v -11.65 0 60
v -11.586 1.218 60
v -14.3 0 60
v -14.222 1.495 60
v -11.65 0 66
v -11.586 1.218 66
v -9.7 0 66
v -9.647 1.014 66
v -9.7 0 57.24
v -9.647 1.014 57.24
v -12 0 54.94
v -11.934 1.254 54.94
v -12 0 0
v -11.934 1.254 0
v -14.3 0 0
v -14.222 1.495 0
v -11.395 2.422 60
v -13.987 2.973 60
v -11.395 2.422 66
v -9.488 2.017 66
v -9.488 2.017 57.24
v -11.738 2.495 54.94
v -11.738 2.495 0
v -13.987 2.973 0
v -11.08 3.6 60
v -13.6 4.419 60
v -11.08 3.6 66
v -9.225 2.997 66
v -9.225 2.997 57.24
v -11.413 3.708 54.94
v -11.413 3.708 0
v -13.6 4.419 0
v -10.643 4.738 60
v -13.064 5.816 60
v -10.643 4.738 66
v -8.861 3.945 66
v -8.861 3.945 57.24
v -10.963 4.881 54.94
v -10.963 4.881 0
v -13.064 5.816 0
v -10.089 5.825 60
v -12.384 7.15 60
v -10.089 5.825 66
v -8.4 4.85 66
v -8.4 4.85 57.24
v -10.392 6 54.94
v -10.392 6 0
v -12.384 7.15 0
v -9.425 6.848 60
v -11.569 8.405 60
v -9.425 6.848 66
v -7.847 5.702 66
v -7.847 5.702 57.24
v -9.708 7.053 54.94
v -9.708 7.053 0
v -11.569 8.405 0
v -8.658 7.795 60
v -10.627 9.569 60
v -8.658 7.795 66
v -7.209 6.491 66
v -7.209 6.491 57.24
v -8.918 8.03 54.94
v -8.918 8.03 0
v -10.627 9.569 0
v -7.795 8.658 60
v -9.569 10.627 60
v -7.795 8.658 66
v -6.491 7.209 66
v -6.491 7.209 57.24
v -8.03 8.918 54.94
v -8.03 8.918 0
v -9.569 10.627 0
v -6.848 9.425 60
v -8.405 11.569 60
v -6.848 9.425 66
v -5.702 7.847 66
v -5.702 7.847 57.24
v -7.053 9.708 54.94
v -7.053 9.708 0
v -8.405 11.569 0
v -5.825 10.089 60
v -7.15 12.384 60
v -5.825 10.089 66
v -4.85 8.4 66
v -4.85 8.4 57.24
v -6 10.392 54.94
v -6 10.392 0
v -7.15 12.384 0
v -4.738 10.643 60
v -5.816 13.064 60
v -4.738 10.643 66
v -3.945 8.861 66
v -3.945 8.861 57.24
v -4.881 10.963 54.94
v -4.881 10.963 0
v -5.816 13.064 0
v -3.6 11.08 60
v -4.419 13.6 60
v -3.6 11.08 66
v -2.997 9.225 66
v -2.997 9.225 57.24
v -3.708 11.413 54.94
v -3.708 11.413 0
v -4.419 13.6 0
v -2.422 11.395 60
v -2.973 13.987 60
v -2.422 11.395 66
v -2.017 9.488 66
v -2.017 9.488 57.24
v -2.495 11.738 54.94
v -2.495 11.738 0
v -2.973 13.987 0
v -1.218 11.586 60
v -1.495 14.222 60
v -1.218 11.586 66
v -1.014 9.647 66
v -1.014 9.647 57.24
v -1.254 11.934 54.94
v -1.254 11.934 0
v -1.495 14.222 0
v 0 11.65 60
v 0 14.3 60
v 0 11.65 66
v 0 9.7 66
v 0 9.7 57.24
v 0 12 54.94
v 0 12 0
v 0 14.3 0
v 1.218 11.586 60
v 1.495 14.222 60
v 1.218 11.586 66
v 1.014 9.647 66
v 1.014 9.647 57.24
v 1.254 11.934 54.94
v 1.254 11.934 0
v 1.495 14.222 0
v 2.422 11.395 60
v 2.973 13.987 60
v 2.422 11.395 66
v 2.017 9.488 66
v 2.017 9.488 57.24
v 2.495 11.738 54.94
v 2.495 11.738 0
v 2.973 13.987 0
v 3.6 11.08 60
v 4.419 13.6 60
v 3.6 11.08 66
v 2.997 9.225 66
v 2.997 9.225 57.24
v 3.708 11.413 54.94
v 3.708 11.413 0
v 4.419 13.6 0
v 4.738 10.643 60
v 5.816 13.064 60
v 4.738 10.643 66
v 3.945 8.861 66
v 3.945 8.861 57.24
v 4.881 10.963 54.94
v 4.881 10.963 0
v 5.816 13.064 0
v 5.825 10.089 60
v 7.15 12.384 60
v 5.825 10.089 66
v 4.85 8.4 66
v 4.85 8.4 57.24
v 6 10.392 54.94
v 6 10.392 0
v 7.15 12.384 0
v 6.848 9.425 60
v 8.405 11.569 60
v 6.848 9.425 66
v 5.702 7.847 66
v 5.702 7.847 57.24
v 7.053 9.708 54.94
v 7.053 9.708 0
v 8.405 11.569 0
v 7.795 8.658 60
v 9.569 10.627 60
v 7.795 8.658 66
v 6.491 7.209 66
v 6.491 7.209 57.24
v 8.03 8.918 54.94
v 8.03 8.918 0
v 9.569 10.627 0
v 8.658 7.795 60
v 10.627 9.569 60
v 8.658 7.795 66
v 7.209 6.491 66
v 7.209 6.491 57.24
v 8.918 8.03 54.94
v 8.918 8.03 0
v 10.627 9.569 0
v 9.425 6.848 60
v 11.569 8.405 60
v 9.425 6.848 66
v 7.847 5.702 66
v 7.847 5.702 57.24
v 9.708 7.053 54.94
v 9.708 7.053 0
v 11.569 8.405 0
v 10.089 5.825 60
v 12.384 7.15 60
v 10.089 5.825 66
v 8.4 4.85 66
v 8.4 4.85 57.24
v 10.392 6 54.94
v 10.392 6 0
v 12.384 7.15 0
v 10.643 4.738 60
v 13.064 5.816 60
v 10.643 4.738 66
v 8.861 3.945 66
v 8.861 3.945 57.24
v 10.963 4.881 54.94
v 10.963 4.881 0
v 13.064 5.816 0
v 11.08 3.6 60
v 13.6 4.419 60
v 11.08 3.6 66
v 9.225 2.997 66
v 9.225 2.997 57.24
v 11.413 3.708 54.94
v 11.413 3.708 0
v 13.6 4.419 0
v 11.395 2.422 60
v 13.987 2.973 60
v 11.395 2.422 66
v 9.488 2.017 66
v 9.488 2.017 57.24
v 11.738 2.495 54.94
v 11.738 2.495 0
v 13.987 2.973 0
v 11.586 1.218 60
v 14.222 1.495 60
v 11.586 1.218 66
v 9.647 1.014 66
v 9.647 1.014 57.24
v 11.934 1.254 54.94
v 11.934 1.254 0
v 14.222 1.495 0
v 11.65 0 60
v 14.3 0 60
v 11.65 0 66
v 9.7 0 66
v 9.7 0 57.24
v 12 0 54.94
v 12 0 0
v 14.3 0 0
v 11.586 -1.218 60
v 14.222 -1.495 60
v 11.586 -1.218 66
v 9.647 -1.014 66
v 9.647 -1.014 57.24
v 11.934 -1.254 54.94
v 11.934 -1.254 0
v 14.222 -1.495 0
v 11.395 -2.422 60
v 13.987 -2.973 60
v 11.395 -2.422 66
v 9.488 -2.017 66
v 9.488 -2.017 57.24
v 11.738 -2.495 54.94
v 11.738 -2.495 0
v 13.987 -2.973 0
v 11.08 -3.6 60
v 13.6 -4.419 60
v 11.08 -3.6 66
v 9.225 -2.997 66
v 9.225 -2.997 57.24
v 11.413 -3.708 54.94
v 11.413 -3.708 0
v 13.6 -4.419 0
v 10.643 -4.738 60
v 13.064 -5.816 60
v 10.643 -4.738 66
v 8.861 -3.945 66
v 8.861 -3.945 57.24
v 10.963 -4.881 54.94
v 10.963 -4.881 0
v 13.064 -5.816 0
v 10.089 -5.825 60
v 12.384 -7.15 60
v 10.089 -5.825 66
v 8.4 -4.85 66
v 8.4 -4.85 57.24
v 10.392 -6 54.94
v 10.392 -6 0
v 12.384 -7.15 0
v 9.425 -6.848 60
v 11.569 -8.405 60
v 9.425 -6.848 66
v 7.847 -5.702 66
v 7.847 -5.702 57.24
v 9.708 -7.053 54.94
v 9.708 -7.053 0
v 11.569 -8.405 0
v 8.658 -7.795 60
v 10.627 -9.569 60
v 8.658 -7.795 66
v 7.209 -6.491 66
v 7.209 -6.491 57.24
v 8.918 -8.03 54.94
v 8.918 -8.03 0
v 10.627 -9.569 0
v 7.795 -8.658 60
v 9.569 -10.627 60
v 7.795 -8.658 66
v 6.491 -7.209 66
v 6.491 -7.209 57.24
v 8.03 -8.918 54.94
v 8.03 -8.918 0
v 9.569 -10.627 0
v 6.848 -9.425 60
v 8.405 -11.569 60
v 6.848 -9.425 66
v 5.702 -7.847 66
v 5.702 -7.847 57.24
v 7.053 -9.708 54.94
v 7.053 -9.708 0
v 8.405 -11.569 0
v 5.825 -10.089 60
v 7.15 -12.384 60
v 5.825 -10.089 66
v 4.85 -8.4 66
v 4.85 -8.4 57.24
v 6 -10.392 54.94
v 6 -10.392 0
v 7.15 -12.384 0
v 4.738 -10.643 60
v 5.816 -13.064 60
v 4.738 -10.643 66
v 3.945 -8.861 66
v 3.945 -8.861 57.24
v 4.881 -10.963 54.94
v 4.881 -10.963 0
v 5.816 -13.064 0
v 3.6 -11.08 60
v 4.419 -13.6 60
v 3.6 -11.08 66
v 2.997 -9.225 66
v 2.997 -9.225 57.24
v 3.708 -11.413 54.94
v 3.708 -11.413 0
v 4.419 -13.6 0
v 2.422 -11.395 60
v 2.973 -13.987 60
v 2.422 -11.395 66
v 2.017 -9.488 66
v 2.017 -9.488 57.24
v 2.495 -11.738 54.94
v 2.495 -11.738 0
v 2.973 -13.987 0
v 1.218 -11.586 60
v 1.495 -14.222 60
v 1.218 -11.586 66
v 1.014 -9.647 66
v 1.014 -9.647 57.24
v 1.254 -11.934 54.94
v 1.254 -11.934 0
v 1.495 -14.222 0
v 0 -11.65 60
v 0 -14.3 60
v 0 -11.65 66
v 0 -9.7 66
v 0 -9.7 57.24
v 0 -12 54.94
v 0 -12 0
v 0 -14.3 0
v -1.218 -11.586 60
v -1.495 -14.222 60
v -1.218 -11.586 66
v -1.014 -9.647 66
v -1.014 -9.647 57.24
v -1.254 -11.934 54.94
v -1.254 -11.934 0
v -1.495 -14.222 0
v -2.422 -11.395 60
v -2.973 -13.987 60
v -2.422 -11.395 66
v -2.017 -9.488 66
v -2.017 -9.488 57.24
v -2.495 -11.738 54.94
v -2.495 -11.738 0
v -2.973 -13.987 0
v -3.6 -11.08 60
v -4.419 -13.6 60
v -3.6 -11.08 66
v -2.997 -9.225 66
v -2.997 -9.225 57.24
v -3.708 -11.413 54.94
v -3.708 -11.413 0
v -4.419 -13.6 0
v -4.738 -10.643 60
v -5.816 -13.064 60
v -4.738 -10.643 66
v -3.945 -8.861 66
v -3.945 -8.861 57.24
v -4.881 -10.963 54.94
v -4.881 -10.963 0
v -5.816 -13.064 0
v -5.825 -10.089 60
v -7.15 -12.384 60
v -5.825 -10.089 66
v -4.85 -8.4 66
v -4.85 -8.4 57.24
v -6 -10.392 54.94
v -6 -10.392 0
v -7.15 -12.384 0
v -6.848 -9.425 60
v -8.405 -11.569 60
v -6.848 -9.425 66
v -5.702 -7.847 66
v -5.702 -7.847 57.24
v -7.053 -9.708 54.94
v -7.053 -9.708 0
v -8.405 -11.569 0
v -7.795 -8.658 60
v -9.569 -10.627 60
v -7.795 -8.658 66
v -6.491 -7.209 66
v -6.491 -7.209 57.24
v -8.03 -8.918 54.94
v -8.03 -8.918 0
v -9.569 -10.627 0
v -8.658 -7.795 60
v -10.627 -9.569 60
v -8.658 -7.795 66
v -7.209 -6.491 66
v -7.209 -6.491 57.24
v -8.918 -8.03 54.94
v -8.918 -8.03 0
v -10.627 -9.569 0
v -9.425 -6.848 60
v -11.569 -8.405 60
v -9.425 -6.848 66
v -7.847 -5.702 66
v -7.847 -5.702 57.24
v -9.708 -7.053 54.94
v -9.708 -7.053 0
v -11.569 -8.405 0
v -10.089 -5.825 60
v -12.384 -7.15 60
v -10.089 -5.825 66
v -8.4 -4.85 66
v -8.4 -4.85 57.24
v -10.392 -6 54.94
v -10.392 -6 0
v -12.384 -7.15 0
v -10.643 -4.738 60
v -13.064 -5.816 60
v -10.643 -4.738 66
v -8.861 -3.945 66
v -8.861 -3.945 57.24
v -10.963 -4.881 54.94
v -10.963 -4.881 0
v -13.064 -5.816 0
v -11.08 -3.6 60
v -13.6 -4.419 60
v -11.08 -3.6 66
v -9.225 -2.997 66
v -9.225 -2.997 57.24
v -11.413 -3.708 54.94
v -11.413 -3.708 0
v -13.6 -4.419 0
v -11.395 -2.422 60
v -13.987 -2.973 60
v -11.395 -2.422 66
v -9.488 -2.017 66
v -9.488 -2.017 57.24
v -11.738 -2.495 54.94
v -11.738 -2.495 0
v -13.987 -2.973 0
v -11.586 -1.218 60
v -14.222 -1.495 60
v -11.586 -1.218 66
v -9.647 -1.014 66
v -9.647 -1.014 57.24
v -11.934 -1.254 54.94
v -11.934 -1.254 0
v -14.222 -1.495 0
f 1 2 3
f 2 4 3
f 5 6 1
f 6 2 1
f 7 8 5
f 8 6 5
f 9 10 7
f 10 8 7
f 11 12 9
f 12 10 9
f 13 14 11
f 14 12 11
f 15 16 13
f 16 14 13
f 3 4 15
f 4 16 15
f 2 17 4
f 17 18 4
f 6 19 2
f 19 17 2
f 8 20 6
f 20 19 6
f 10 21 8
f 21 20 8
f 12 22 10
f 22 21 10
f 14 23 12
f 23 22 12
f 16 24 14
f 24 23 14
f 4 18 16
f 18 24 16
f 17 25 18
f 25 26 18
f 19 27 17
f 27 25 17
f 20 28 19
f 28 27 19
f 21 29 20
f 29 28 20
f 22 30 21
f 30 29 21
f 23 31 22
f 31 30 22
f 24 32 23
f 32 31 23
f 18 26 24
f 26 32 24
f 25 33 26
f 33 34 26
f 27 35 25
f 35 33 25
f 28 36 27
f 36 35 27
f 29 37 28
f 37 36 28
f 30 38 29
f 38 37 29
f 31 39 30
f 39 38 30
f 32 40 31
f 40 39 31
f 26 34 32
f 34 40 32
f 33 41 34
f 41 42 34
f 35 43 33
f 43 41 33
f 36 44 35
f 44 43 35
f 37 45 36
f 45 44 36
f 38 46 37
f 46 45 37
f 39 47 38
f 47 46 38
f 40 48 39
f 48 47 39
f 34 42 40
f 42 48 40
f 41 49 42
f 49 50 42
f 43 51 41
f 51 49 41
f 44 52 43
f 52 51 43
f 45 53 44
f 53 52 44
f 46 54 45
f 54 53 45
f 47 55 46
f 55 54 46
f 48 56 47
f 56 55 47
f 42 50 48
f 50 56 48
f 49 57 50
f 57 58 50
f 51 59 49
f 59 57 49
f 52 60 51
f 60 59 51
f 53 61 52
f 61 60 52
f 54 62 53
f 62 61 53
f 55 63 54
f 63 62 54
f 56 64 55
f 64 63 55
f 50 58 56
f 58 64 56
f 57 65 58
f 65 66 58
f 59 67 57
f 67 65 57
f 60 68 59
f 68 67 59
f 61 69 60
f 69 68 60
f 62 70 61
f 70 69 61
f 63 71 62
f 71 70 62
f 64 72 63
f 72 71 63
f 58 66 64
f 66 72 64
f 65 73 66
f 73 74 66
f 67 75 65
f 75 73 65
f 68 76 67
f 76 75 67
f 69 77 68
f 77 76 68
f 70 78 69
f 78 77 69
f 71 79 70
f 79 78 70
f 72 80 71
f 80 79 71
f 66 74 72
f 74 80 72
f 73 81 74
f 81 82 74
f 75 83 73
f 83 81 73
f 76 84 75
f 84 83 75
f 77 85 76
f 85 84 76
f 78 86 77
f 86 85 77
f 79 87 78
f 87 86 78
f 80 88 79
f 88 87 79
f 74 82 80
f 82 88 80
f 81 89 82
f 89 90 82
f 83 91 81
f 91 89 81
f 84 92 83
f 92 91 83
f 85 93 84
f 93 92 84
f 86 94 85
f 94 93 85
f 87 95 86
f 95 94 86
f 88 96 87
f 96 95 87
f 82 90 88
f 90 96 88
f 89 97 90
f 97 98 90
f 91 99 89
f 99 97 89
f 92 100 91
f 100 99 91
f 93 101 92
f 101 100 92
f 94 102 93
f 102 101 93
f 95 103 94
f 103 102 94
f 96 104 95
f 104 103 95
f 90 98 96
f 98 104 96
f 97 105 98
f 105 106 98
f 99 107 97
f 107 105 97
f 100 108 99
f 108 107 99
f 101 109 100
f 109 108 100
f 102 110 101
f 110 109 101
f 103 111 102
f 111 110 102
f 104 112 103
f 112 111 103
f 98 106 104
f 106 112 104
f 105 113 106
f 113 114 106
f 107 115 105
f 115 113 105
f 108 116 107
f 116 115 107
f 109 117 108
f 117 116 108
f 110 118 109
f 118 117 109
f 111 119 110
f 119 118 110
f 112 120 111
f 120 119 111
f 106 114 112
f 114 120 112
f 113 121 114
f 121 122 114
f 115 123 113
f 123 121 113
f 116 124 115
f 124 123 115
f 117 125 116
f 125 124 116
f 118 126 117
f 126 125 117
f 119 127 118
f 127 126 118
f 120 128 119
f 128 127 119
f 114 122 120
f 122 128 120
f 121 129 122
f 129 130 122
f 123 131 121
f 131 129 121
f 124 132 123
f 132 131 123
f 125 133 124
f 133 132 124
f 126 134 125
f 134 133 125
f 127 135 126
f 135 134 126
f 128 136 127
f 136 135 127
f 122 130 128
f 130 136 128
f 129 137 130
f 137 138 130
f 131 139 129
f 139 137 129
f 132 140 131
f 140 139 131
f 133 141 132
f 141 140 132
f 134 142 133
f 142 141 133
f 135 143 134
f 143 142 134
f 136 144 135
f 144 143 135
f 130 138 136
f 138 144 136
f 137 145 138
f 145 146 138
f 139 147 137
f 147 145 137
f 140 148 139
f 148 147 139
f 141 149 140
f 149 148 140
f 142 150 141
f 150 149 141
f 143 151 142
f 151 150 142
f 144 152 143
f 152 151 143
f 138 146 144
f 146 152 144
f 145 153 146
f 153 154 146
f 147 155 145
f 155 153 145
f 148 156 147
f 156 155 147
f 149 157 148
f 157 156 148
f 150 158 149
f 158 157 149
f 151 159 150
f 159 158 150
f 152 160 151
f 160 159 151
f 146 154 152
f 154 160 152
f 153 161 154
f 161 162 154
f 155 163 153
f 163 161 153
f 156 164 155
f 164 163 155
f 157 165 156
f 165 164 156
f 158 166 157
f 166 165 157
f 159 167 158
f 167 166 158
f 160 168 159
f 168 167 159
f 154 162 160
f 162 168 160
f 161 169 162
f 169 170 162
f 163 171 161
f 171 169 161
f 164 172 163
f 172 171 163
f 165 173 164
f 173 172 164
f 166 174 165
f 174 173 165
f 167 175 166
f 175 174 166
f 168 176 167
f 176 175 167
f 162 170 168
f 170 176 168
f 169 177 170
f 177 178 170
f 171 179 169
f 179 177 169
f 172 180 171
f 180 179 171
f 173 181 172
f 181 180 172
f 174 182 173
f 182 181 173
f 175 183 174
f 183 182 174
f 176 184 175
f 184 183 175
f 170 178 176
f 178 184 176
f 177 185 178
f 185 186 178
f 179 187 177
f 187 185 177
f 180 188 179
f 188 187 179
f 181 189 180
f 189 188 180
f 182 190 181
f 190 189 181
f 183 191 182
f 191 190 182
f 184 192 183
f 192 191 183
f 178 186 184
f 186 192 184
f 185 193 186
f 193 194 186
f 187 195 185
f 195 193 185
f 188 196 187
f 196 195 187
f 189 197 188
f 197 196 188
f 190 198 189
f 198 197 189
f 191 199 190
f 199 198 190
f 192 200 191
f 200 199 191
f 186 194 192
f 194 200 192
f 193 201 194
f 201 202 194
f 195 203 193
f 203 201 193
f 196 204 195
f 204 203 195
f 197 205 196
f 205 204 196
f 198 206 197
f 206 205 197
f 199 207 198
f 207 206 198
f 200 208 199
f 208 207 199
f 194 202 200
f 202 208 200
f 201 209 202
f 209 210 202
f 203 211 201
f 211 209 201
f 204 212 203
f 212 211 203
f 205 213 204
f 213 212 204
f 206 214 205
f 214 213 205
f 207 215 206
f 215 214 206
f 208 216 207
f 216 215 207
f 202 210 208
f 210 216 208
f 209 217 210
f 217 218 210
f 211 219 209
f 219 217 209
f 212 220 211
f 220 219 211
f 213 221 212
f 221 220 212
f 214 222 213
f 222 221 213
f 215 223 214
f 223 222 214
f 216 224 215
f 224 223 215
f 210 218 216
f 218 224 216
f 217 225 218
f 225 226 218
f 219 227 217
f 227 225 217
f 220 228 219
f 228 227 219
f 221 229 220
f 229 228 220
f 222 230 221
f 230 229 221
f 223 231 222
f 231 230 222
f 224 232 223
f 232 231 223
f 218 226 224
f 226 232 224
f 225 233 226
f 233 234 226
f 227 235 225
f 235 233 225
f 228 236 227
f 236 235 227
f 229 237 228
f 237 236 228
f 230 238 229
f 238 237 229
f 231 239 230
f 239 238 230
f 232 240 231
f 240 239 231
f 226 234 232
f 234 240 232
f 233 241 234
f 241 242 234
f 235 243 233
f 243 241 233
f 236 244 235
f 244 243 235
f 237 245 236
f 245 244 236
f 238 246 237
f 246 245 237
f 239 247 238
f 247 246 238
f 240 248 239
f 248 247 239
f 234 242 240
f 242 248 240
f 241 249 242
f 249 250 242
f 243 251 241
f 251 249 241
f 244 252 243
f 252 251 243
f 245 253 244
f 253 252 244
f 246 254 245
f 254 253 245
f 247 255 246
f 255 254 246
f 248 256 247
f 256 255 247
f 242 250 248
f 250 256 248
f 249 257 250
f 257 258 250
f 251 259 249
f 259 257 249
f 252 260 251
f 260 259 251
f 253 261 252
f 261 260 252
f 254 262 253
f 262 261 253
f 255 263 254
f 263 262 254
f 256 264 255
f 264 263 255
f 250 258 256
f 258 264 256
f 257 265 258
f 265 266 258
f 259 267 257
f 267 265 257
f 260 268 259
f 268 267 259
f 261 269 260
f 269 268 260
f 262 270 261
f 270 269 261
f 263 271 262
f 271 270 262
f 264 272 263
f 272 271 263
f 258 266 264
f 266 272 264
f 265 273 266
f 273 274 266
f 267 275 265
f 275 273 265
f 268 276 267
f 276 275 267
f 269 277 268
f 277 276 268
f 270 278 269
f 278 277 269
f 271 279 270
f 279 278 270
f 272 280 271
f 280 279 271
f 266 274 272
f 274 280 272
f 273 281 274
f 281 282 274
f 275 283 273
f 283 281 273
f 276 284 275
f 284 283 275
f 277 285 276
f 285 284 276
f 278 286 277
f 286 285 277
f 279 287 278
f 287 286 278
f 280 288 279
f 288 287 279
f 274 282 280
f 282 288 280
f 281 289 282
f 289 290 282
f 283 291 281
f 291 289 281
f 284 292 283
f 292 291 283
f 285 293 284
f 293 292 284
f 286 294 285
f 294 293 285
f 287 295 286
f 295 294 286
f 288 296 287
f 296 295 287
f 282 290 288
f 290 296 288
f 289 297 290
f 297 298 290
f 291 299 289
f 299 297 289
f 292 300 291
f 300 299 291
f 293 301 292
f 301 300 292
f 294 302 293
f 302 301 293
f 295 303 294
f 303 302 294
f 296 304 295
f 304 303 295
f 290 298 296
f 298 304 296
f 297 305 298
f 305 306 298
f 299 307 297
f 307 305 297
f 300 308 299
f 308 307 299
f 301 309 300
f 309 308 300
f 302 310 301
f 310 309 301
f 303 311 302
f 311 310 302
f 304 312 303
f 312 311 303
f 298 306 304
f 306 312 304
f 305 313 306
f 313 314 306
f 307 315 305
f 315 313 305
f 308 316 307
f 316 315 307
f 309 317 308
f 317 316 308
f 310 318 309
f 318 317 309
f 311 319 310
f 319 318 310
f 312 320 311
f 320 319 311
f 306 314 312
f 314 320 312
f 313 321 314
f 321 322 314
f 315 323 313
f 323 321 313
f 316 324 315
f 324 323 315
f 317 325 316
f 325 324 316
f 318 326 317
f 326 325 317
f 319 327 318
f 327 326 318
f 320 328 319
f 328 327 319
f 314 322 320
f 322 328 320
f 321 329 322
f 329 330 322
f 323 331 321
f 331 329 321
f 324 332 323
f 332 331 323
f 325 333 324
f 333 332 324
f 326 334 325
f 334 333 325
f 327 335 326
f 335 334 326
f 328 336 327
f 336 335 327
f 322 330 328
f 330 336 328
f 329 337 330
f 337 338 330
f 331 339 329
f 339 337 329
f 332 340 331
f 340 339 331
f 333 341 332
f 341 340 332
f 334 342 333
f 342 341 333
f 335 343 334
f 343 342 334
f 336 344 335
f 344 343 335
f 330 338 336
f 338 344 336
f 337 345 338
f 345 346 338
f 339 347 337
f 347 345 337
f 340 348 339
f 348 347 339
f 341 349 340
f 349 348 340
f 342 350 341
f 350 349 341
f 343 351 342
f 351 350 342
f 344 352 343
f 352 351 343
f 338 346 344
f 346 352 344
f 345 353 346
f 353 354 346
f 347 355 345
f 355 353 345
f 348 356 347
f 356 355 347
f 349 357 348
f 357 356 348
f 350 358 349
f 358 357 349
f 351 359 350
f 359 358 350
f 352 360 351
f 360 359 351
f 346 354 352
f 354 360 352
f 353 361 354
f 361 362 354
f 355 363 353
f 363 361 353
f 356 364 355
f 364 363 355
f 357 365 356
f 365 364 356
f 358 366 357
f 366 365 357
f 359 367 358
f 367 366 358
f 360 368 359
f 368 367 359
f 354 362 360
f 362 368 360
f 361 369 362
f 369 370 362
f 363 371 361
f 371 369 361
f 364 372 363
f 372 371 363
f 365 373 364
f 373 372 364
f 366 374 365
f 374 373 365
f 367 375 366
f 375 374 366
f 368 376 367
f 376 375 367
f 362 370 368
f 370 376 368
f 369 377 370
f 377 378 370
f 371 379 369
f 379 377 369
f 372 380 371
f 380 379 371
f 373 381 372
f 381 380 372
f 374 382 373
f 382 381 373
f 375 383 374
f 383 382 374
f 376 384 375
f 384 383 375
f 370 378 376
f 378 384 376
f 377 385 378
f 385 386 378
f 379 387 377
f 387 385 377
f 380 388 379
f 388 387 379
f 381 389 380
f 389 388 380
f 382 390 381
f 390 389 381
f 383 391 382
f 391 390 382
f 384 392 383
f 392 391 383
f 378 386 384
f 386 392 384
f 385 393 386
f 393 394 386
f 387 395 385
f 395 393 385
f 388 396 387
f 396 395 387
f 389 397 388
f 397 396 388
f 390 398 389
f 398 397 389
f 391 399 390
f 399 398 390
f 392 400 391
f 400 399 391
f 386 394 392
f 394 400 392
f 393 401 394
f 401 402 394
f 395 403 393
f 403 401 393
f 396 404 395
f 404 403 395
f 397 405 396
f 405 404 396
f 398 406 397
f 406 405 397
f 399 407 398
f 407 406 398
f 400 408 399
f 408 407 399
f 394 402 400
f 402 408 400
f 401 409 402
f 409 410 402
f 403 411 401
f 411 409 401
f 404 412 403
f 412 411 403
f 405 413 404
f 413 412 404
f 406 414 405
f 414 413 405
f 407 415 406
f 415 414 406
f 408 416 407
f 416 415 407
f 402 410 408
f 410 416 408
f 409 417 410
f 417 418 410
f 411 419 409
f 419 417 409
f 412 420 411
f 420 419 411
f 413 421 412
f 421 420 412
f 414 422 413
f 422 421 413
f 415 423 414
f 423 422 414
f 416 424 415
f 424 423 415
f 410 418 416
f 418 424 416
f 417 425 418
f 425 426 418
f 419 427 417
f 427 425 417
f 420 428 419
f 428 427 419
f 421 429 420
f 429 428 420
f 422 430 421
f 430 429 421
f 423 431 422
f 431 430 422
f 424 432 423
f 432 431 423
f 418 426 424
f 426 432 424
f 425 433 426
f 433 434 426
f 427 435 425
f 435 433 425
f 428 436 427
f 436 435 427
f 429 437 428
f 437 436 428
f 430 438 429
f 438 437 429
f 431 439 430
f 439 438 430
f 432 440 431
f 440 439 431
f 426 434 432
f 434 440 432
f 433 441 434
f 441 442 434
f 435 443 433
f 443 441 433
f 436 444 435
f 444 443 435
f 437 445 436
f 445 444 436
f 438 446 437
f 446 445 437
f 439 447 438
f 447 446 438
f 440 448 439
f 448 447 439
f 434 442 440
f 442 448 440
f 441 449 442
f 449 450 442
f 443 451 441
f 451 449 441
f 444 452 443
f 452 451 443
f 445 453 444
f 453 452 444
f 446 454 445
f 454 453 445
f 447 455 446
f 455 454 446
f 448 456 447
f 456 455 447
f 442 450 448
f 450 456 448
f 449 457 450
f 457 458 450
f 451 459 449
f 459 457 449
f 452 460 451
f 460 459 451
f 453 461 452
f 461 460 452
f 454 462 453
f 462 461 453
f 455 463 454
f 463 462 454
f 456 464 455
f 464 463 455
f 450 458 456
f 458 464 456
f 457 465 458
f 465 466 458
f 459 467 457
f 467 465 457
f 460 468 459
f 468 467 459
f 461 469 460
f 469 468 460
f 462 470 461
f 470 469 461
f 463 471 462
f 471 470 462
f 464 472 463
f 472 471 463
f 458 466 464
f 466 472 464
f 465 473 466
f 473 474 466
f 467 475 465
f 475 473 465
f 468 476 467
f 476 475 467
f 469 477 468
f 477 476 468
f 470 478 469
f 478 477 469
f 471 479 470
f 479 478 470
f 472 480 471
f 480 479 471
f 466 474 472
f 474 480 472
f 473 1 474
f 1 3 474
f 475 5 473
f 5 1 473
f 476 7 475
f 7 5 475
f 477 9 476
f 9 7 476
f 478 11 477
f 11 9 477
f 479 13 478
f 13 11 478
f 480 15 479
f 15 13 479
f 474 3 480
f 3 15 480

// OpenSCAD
// Marble run piece generator
// Works with:
// https://www.thingiverse.com/thing:4079409
// https://www.thingiverse.com/thing:3460633

// Slicer notes: Cura will need the "print thin walls"
// box checked to use generated supports.

/* [General] */

// Which piece to print
which_piece = "60mm"; // [20mm:20mm straight, 60mm:60mm straight, 120mm:120mm straight, 60x100:60mm X 100mm long drop, 60x100c:60 X 100 drop (covered), 120x150:120mm X 150mm long drop, whirlpool:120mm whirlpool]
// Generate supports, if applicable for selected piece
generate_support = true;

/* [Advanced options] */
// $fn = 120 produces nice curves but ridiculously large gcode and correspondingly long print times.
$fn = 60;
// Length of the interface that fits inside another piece
interface_length = 6;
// Radius of the receptacle part
inside_radius = 12;
// Wall thickness
wall_thickness = 2.3;
// Distance between shoulder and top of inward reduction
// in units of wall thickness
inside_reduction_distance = 1.2;
// Radial tolerance means how much we subtract from inside radius to fit inside another piece
radial_tolerance = 0.35;
// Shallowness factor is the amount we remove from a half-cylinder to create a gutter, in units of inside_radius
shallowness = 0.28;
// Inside radius to fit snugly over 3/4" 250lb. PVC
pvc_receptacle_inside_radius = 13.7;
// Show profiles
debug = 0;

// Cross-section polygon for adapter of specified height
// Although a polygon is implicitly in the X,Y plane,
// rotate_extrude() implicitly uses the polygon from the
// X,Z plane.
module cross_section( adapter_height )
{
    polygon(points=[
        [inside_radius,0],
        [inside_radius, adapter_height - inside_reduction_distance * wall_thickness - wall_thickness], // 45 degrees
        [inside_radius - wall_thickness, adapter_height - inside_reduction_distance * wall_thickness],
        [inside_radius - wall_thickness,adapter_height + interface_length],
        [inside_radius - radial_tolerance,adapter_height + interface_length],
        [inside_radius - radial_tolerance,adapter_height],
        [inside_radius + wall_thickness,adapter_height],
        [inside_radius + wall_thickness,0]]);
}

// Inside or outside of whirlpool. Inside is a cutter so goes slightly above and below
module whirlpool_cross_section( base, inside_cutter )
{
    // Height from outside bottom to outside top
    height = 32;
    // Base = elevation of outside bottom
    top = inside_cutter ? base + height + 1 : base + height;
    bottom = inside_cutter ? base - 1 : base;
    radius = inside_cutter ? 50 : 52;
    bottom_radius = inside_cutter ? inside_radius : inside_radius + wall_thickness;
    // Cornering offset assumes travel from bottom to top
    corner_offset_sign = inside_cutter ? 1 : -1;
    // In FreeCAD we'd do this with Bezier curves...
    // Perform fillet on sharp edges
 //echo("Bottom",bottom,"br",bottom_radius,"top",top,"radius",radius);
    polygon(points=[
        [0,bottom],
        [bottom_radius,bottom],
        [bottom_radius,bottom+10 + wall_thickness * sin(45) * corner_offset_sign],
        [radius,bottom+20 + wall_thickness * sin(45) * corner_offset_sign],
        [radius,top],
        [0,top]
    ]);
}

// Adapter height is from base to top of shoulder;
// i.e. when inserted into the next piece above,
// how much height does it add?
module basic_adapter( adapter_height, solid_mask = false )
{
    // Minimum height of the base-to-shoulder is
    // interface length + wall thickness (for inside slant)
    // + wall thickness * inside_reduction_distance (for outer shoulder)
    min_height = interface_length + wall_thickness + inside_reduction_distance * wall_thickness;
  if (adapter_height < min_height)
  {
      echo( "Invalid height", adapter_height, "- minimum", min_height );
  }
  else
      if (solid_mask)
          hull()
            rotate_extrude(convexity=10)
                cross_section( adapter_height );
      else
          // Note that the documentation for rotate_extrude()
          // does actually explain that there's an implicit
          // rotation from rotated around the Y axis to
          // rotated around the Z axis.
          rotate_extrude(convexity=10)
            cross_section( adapter_height );

}

// Gutter from top of start adapter to bottom of end adapter
module gutter_drop( start_adapter_height, end_adapter_height, gutter_length, solid_mask = false, covered = false )
{
    // Start elevation for gutter needs to allow space for entire cylinder
    // Gutter length is distance from center of start to center of end
    // Note that elevation is for the bottom of each end
    // at the point of entry/exit
    top_reduction = 3 * inside_radius + wall_thickness;
    start_elevation = start_adapter_height - top_reduction/*  - wall_thickness - inside_reduction_distance * wall_thickness*/;
    end_elevation = interface_length + wall_thickness;
    // Actual gutter length goes from far inside wall of start to center of end
    actual_gutter_length = gutter_length + inside_radius;
    // Actual length extends into both adapters and
    // is the hypotenuse of the drop.
    // Start goes to the far wall of the cylinder
    drop_height = start_elevation - end_elevation;
    actual_length = sqrt(actual_gutter_length * actual_gutter_length + drop_height * drop_height);
    // When we rotate downward, we also need to shift slightly
    downward_slant = atan(drop_height / gutter_length);
    outside_diameter = 2 * (wall_thickness + inside_radius);
    echo("Gutter:", gutter_length, "AGL:", actual_gutter_length, "Drop:", drop_height, "actual:", actual_length, "Slant:", downward_slant, "Start:", start_elevation, "tr:", top_reduction, "End:", end_elevation);
    // Hollow out end adapter from gutter intrusion,
    // and cut holes in walls. Note that covered connector
    // requires additional hollowing on the end and also
    // requires hollowing on the start adapter.
    difference()
    {
        // Z translation for gutter is start elevation 
        // plus half of OD, since the cylinder is rotated on center
        gutter_z = start_elevation + inside_radius + wall_thickness; // was start_adapter_height-3 * wall_thickness - interface_length
        // Create start and end adapters
        union()
        {
            // Start adapter
            basic_adapter( start_adapter_height, solid_mask = solid_mask );
            // End adapter
            translate([gutter_length, 0, 0]) basic_adapter( end_adapter_height, solid_mask = solid_mask );
            // Clip gutter by hull enclosing both start and end adapters
            intersection()
            {
                hull()
                {
                    basic_adapter( start_adapter_height );
                    translate([gutter_length, 0, 0])
                        basic_adapter( end_adapter_height );
                }

                // Basic hollow cylinder for the gutter,
                // first rotated into downward slant,
                // then translated to butt against rear wall
                // of start adapter.
                translate([-1*(inside_radius + wall_thickness),0,gutter_z]) rotate([0,90+downward_slant,0]) difference()
                {
                    cylinder(h=actual_length, r=inside_radius + wall_thickness);
                    if (!solid_mask) translate([0,0,-1]) cylinder(h=actual_length+2, r=inside_radius);
                    // Cut away top half
                    if (!solid_mask && !covered) translate([inside_radius * -3 + inside_radius * shallowness, inside_radius * -1.5, -1])
                      cube([inside_radius * 3, inside_radius * 3, actual_length + 2]);
                }
            }
        }
        // Cut out inside of end adapter (which has a gutter intrusion). 
        // This needs to be slightly higher for covered gutter
        // but we don't want to cut into the taper at the top.
        if (!solid_mask) translate([gutter_length, 0, 0])
          cylinder(h=end_elevation + 2 * (inside_radius + wall_thickness) + sin(downward_slant) * tan(downward_slant) * outside_diameter + 1, r=inside_radius);
        // Also cut out inside of start adapter for
        // covered gutter case. This needs to start at
        // the center of the gutter.
        // This goes down a bit low for shallow slants but also works for steeper inclinations
        start_interface_top = start_elevation + outside_diameter /* + sin(downward_slant) * tan(downward_slant) * outside_diameter*/;
        // start elevation is the elevation at the far inside wall of start adapter
        start_interface_middle = start_elevation /*+ inside_radius */ + wall_thickness;
        //echo("SIT:", start_interface_top, "OD:", outside_diameter, "Sin(S)*tan(S)*OD:", sin(downward_slant), tan(downward_slant), sin(downward_slant) * tan(downward_slant) * outside_diameter );
        if (!solid_mask)
            translate([0,0,start_interface_middle])
                cylinder(h=start_interface_top - start_interface_middle, r=inside_radius);
        // Cut holes in walls, clipped by inside half
        // of each adapter
        if (!solid_mask) intersection()
        {
            translate([-1*(inside_radius + wall_thickness),
                    0,
                    gutter_z])
                rotate([0,90+downward_slant,0])
                    cylinder(h=actual_length, r=inside_radius);
            translate([0,-1.5*inside_radius,0]) cube([gutter_length + 2 * (inside_radius + wall_thickness),3*inside_radius,start_adapter_height + end_adapter_height]);
        }
    }
}

// Basic drop from two adapters of specified height
module basic_drop( adapter_height, gutter_length, adapter2 = 0, covered_connector = false )
{
    end_adapter_height = ((adapter2 != 0) ? adapter2 : adapter_height);
    //echo("BD: ah:", adapter_height, "GL:", gutter_length, "A2:", adapter2, "EAH:", end_adapter_height);
    gutter_drop( adapter_height, end_adapter_height, gutter_length, covered = covered_connector );
    if (generate_support)
    {
        start_height = adapter_height - 1.8 * inside_radius;
        end_height = interface_length + inside_radius;
        difference()
        {
            rotate([90,0,0]) 
                union()
                {
                    linear_extrude(height=0.4)
                        polygon(points=[
                    [inside_radius+wall_thickness,0],
                    [inside_radius+wall_thickness, start_height],
                    [inside_radius + wall_thickness + gutter_length, end_height],
                    [inside_radius + wall_thickness + gutter_length, 0]
                        ]);
                    translate([0,0,-0.4])
                        linear_extrude(height=0.8)
                            polygon(points=[
                               [inside_radius + wall_thickness,0],
                               [inside_radius + wall_thickness, 2],
                               [inside_radius + wall_thickness + gutter_length, 2],
                               [inside_radius + wall_thickness + gutter_length, 0]
                            ]);
                }
            gutter_drop( adapter_height, end_adapter_height, gutter_length, solid_mask = true );
            translate([0,0,-0.4]) gutter_drop( adapter_height, end_adapter_height, gutter_length, solid_mask = true );
            translate([0.8,0,0]) gutter_drop( adapter_height, end_adapter_height, gutter_length, solid_mask = true );
            translate([-0.8,0,0]) gutter_drop( adapter_height, end_adapter_height, gutter_length, solid_mask = true );
        }
    }
}

module whirlpool_bowl(whirlpool_base)
{
    difference()
    {
        rotate_extrude(convexity=4)
            whirlpool_cross_section(whirlpool_base, false);
        rotate_extrude(convexity=4)
            whirlpool_cross_section(whirlpool_base, true);
        // Cutaway view for debugging purposes
        //#translate([0,-60,0]) cube([120,120,100]);
    }
}

module whirlpool_exit(whirlpool_base, mask=false)
{
    union()
    {
        translate([0,-(inside_radius + wall_thickness + 5),whirlpool_base+0.1])
        // Square top with bottom of bowl
        rotate([2,0,0])
        // Rotate into vertical drain position
        rotate([0,90,0])
        difference()
        {
        rotate_extrude(convexity=4, angle=88)
            translate([inside_radius + wall_thickness + 5,0,0])
                circle(r=(inside_radius + wall_thickness));
        rotate([0,0,-1])
            rotate_extrude(convexity=4, angle=92)
                translate([inside_radius + wall_thickness + 5,0,0])
                    circle(r=(inside_radius));
        }
        translate([0,-(inside_radius + wall_thickness+4),whirlpool_base-19.15]) rotate([92,0,0]) difference()
        {
            linear_extrude(height=46)
            circle(r=(inside_radius + wall_thickness));
            if (!mask)
            translate([0,0,-0.1]) linear_extrude(height=46.2)
            circle(r=inside_radius);
        }
    }
}

module whirlpool(base_elevation)
{
    union()
    {
        translate([0,64.5,0])
        difference()
        {
            intersection()
            {
                rotate([0,0,-53.8])
                gutter_drop(120, 120, 281);
                cylinder(r=(inside_radius+wall_thickness+40), h=140);
            }
            translate([-0.5*wall_thickness,-64.5 - wall_thickness,0]) hull() union() {
                whirlpool_bowl(base_elevation);
                translate([0,0,30]) whirlpool_bowl(base_elevation);
            }
        }
        whirlpool_bowl(base_elevation);
        difference()
        {
            union()
            {
                whirlpool_exit(base_elevation);
                difference()
                {
                    translate([0,-64.3,0]) basic_adapter(120);
                    whirlpool_exit(base_elevation, mask=true);
                }
            }
            translate([0,-64.3,0]) cylinder(r=inside_radius, h=100);
        }
        // Add support for exit
        translate([0,-49.5,0]) cube([0.4,35,8.5]);
    }
}

// Minimum is 11.06
//basic_adapter(10);
if (which_piece == "20mm")
    basic_adapter(20);
if (which_piece == "60mm")
    basic_adapter(60);
if (which_piece == "120mm")
    basic_adapter(120);
if (which_piece == "60x100")
    basic_drop(60, 100);
if (which_piece == "60x100c")
    basic_drop(60, 100, covered_connector=true);
if (which_piece == "120x150")
    basic_drop(120, 150, adapter2=60);
if (which_piece == "whirlpool")
    whirlpool(42);
//basic_adapter(120);
//translate([40,0,0]) basic_adapter(20);
//cross_section(70);
//basic_drop( 60, 100 );
// Currently only works up until around 75, regardless
// of whether heights are symmetric or asymmetric
//gutter_drop( 75, 75, 100, solid_mask = false );
if (debug)
{
    cross_section(20);
    translate([0,28,0]) cross_section(11.75);
}
